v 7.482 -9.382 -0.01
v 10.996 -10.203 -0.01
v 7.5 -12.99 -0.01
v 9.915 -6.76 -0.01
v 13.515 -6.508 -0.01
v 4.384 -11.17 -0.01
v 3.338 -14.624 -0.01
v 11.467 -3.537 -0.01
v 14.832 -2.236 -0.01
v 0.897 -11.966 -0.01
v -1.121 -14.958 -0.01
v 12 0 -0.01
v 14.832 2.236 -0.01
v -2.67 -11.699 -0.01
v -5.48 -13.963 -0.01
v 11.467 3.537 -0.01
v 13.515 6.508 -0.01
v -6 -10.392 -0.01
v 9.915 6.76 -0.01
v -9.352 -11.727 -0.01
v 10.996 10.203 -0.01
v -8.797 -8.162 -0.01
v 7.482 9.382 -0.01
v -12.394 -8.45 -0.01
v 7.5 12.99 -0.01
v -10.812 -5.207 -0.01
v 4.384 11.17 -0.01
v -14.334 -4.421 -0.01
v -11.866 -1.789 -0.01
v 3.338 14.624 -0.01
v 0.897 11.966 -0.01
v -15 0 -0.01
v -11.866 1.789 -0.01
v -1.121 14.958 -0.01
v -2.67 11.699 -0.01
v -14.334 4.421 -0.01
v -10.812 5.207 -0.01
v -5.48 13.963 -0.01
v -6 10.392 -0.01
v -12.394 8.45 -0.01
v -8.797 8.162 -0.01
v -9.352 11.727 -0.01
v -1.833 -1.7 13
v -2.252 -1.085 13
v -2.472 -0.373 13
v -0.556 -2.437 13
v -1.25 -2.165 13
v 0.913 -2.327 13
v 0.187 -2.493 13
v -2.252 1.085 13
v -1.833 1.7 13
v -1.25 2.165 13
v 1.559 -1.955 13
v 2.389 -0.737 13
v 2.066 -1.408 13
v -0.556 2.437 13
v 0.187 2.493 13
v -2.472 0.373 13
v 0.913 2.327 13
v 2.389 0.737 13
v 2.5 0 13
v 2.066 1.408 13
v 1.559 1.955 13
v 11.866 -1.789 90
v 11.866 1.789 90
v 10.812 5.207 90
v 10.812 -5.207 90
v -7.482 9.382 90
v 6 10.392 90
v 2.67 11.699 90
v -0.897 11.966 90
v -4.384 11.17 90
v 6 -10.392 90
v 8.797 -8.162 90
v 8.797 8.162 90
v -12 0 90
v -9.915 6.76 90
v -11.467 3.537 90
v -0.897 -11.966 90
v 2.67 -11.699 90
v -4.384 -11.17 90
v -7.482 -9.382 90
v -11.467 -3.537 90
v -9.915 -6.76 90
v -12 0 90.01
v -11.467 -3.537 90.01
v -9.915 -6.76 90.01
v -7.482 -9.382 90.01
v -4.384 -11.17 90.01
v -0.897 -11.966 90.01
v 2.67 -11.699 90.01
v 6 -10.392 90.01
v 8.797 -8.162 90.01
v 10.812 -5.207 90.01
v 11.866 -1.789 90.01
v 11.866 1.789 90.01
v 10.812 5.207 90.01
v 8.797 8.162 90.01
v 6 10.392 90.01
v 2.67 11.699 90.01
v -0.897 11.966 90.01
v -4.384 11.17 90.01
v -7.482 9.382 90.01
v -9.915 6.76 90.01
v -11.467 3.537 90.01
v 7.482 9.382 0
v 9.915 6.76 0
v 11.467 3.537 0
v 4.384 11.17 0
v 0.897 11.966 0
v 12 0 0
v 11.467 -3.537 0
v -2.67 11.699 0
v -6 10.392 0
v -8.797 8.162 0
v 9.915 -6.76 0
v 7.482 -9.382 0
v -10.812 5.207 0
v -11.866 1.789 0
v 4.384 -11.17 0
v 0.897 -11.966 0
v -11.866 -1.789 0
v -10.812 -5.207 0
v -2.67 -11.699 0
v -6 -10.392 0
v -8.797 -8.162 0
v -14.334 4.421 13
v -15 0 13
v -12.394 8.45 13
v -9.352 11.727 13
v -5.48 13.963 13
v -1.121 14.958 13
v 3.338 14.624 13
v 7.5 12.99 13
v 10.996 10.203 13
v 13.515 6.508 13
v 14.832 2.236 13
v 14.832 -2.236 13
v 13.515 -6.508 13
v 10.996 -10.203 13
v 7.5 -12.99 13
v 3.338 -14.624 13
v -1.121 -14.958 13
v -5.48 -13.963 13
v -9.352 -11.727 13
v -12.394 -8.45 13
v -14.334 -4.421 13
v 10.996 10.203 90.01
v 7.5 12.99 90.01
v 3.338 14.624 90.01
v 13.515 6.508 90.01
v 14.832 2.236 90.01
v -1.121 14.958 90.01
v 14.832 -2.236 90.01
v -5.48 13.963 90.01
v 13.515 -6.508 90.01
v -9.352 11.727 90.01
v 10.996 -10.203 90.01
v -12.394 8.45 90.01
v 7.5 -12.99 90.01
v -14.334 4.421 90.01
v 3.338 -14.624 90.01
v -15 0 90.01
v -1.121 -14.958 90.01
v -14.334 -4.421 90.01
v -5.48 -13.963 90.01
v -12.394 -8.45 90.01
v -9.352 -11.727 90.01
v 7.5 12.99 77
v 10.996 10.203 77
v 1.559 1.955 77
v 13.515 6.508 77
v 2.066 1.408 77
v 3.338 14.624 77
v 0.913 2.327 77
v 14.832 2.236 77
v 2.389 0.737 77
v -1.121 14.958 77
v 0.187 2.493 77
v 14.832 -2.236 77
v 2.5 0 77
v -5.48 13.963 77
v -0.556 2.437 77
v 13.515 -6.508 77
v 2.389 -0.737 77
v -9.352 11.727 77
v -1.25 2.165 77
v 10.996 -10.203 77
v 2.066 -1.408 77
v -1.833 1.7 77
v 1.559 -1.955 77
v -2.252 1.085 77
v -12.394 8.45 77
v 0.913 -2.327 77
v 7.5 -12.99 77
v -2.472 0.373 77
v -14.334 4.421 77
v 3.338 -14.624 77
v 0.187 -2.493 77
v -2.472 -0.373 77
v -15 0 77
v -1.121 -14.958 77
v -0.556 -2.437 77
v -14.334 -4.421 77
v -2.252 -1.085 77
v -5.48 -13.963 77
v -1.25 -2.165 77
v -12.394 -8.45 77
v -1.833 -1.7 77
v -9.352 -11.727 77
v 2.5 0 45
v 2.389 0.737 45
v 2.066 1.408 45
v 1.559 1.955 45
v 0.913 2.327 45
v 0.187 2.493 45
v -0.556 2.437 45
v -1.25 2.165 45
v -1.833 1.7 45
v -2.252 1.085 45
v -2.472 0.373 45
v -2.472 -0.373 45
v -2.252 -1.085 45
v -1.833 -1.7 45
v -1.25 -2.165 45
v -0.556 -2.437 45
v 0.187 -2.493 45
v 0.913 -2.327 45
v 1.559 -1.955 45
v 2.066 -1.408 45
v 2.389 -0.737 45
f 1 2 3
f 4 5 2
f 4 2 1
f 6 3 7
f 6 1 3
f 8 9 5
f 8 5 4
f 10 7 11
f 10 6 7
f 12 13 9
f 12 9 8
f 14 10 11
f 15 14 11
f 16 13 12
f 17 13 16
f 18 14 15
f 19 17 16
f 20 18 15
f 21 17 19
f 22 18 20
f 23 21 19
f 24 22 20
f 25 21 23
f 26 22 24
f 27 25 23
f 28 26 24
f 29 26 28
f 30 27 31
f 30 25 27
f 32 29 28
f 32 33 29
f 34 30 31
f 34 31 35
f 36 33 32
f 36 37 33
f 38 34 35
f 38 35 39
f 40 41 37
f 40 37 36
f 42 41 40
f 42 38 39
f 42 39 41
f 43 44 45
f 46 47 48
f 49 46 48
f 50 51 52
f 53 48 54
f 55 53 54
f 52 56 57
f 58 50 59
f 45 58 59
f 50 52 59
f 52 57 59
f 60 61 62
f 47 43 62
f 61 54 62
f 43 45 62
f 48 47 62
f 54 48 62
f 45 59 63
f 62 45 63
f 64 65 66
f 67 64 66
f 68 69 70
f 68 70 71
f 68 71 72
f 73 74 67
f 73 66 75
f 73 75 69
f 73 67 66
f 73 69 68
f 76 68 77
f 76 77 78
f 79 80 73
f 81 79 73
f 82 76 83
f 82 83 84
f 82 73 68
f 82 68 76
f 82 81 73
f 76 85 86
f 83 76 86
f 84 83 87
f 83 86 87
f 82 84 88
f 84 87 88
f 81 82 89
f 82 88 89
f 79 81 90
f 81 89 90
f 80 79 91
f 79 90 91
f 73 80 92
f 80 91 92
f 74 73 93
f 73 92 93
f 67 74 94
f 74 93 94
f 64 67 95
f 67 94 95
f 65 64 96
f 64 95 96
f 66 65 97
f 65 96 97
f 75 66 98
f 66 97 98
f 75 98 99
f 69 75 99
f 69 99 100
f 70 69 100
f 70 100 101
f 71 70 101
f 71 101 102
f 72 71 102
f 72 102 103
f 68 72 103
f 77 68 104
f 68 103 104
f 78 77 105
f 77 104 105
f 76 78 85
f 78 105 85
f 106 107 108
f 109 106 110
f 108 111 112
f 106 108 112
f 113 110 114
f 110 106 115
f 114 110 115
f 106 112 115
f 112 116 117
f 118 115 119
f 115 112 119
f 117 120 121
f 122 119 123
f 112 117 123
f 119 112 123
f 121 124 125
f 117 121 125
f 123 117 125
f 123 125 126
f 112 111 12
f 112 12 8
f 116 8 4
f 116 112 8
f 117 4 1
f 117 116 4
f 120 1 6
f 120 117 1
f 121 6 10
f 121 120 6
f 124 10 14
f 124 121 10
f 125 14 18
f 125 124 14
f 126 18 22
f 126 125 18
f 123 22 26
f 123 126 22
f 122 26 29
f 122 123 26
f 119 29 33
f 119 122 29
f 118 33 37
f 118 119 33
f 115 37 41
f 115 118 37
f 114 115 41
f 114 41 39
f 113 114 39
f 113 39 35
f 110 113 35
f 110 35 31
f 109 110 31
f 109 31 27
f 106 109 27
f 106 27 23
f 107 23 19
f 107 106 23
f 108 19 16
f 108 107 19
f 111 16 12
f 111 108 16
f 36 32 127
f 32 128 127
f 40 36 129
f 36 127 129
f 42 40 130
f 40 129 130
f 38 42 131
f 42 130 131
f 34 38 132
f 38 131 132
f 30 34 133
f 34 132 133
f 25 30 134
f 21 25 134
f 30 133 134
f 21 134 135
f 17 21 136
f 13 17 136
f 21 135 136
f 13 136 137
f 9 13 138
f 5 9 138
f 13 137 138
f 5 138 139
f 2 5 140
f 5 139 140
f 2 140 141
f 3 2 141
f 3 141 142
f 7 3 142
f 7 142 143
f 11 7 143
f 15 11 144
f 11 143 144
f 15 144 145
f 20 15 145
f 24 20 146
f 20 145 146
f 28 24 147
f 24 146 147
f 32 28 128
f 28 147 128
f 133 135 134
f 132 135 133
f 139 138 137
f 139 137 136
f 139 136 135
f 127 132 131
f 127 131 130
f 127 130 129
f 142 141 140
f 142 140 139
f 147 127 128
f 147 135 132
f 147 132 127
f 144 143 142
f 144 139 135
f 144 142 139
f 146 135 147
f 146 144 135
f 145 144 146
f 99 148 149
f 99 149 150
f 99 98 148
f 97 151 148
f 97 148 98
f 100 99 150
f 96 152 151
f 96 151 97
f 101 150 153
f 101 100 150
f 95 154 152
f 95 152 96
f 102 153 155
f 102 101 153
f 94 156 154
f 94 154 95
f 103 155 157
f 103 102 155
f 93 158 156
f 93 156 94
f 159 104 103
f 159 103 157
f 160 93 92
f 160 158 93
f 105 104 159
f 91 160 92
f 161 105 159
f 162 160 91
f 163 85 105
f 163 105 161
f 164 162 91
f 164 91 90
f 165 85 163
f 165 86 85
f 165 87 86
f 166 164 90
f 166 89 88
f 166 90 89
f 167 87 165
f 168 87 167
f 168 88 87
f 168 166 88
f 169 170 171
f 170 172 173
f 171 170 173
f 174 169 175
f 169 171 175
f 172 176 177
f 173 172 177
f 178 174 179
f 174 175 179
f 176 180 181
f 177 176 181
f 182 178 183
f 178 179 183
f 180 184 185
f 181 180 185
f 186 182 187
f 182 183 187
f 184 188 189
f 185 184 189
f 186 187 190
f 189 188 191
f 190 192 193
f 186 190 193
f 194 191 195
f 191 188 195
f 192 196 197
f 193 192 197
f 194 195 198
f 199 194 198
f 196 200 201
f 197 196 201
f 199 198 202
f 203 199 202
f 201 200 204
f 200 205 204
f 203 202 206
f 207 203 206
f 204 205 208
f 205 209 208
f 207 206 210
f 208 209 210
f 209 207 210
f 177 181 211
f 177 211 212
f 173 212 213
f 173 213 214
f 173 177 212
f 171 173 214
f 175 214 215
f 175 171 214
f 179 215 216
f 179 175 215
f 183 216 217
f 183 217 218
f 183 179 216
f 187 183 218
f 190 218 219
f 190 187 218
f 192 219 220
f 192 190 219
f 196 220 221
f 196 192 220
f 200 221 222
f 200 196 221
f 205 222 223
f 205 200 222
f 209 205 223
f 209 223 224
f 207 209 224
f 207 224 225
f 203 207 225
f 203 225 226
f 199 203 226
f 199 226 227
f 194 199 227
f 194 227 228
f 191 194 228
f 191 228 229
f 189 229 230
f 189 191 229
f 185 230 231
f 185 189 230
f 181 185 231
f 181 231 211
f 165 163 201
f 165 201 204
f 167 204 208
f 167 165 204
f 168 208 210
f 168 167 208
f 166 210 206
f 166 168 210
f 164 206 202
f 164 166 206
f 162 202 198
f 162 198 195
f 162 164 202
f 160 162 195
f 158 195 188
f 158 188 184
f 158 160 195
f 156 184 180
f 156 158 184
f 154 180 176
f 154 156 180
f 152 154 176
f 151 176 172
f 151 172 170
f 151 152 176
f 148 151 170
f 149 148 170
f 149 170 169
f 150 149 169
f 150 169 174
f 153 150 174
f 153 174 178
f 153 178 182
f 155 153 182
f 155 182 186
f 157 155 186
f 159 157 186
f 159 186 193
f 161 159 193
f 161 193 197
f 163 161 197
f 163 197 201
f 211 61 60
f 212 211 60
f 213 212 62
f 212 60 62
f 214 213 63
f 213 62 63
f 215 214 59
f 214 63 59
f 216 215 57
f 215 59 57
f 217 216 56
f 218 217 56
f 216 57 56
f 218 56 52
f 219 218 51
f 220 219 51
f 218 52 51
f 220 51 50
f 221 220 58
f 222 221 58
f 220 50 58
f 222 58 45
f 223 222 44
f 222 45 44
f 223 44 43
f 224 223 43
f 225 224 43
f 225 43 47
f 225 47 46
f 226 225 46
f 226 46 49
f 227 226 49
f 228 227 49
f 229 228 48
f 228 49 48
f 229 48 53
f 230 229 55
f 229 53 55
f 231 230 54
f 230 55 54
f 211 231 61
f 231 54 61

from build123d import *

# Parameters (mm, degrees)
CROQUIS1_R              = 15
SALIENTE_EXTRUIR1_DEPTH = 13
CROQUIS2_R              = 2.5
SALIENTE_EXTRUIR2_DEPTH = 32
SALIENTE_EXTRUIR3_START = 0.01
CROQUIS3_R              = 15
CROQUIS3_R_2            = 12
SALIENTE_EXTRUIR3_DEPTH = 0.01
CROQUIS4_R              = 15
CROQUIS4_R_2            = 12
SALIENTE_EXTRUIR4_DEPTH = 0.01


with BuildPart() as part:
    # Croquis1 → Saliente-Extruir1 (new body)
    with BuildSketch(Plane.XY):
        Circle(CROQUIS1_R)
    saliente_extruir1 = extrude(amount=SALIENTE_EXTRUIR1_DEPTH)

    # Croquis2 → Saliente-Extruir2 (add)
    with BuildSketch(Plane.XY.offset(13)):
        Circle(CROQUIS2_R)
    saliente_extruir2 = extrude(amount=SALIENTE_EXTRUIR2_DEPTH)


with BuildPart() as body_2:
    # Partir1: the piece on the far side of the plane
    add(part.part)
    split(bisect_by=Plane.XY.offset(13), keep=Keep.BOTTOM)

    # Croquis4 → Saliente-Extruir4 (add)
    with BuildSketch(Plane(origin=(0, 0, 0), x_dir=(-1, 0, 0), z_dir=(0, 0, -1))):
        Circle(CROQUIS4_R)
        Circle(CROQUIS4_R_2, mode=Mode.SUBTRACT)
    extrude(amount=SALIENTE_EXTRUIR4_DEPTH)


with BuildPart() as part_1:
    add(part.part)

    # Partir1
    split(bisect_by=Plane.XY.offset(13), keep=Keep.TOP)

    # Simetría1: Saliente-Extruir1, Saliente-Extruir2 across plane
    add(saliente_extruir1.mirror(Plane.XY.offset(45)))
    add(saliente_extruir2.mirror(Plane.XY.offset(45)))

    # Croquis3 → Saliente-Extruir3 (add)
    with BuildSketch(Plane.XY.offset(90).offset(SALIENTE_EXTRUIR3_START)):
        Circle(CROQUIS3_R)
        Circle(CROQUIS3_R_2, mode=Mode.SUBTRACT)
    extrude(amount=-SALIENTE_EXTRUIR3_DEPTH)


solid = Compound([body_2.part, part_1.part])
